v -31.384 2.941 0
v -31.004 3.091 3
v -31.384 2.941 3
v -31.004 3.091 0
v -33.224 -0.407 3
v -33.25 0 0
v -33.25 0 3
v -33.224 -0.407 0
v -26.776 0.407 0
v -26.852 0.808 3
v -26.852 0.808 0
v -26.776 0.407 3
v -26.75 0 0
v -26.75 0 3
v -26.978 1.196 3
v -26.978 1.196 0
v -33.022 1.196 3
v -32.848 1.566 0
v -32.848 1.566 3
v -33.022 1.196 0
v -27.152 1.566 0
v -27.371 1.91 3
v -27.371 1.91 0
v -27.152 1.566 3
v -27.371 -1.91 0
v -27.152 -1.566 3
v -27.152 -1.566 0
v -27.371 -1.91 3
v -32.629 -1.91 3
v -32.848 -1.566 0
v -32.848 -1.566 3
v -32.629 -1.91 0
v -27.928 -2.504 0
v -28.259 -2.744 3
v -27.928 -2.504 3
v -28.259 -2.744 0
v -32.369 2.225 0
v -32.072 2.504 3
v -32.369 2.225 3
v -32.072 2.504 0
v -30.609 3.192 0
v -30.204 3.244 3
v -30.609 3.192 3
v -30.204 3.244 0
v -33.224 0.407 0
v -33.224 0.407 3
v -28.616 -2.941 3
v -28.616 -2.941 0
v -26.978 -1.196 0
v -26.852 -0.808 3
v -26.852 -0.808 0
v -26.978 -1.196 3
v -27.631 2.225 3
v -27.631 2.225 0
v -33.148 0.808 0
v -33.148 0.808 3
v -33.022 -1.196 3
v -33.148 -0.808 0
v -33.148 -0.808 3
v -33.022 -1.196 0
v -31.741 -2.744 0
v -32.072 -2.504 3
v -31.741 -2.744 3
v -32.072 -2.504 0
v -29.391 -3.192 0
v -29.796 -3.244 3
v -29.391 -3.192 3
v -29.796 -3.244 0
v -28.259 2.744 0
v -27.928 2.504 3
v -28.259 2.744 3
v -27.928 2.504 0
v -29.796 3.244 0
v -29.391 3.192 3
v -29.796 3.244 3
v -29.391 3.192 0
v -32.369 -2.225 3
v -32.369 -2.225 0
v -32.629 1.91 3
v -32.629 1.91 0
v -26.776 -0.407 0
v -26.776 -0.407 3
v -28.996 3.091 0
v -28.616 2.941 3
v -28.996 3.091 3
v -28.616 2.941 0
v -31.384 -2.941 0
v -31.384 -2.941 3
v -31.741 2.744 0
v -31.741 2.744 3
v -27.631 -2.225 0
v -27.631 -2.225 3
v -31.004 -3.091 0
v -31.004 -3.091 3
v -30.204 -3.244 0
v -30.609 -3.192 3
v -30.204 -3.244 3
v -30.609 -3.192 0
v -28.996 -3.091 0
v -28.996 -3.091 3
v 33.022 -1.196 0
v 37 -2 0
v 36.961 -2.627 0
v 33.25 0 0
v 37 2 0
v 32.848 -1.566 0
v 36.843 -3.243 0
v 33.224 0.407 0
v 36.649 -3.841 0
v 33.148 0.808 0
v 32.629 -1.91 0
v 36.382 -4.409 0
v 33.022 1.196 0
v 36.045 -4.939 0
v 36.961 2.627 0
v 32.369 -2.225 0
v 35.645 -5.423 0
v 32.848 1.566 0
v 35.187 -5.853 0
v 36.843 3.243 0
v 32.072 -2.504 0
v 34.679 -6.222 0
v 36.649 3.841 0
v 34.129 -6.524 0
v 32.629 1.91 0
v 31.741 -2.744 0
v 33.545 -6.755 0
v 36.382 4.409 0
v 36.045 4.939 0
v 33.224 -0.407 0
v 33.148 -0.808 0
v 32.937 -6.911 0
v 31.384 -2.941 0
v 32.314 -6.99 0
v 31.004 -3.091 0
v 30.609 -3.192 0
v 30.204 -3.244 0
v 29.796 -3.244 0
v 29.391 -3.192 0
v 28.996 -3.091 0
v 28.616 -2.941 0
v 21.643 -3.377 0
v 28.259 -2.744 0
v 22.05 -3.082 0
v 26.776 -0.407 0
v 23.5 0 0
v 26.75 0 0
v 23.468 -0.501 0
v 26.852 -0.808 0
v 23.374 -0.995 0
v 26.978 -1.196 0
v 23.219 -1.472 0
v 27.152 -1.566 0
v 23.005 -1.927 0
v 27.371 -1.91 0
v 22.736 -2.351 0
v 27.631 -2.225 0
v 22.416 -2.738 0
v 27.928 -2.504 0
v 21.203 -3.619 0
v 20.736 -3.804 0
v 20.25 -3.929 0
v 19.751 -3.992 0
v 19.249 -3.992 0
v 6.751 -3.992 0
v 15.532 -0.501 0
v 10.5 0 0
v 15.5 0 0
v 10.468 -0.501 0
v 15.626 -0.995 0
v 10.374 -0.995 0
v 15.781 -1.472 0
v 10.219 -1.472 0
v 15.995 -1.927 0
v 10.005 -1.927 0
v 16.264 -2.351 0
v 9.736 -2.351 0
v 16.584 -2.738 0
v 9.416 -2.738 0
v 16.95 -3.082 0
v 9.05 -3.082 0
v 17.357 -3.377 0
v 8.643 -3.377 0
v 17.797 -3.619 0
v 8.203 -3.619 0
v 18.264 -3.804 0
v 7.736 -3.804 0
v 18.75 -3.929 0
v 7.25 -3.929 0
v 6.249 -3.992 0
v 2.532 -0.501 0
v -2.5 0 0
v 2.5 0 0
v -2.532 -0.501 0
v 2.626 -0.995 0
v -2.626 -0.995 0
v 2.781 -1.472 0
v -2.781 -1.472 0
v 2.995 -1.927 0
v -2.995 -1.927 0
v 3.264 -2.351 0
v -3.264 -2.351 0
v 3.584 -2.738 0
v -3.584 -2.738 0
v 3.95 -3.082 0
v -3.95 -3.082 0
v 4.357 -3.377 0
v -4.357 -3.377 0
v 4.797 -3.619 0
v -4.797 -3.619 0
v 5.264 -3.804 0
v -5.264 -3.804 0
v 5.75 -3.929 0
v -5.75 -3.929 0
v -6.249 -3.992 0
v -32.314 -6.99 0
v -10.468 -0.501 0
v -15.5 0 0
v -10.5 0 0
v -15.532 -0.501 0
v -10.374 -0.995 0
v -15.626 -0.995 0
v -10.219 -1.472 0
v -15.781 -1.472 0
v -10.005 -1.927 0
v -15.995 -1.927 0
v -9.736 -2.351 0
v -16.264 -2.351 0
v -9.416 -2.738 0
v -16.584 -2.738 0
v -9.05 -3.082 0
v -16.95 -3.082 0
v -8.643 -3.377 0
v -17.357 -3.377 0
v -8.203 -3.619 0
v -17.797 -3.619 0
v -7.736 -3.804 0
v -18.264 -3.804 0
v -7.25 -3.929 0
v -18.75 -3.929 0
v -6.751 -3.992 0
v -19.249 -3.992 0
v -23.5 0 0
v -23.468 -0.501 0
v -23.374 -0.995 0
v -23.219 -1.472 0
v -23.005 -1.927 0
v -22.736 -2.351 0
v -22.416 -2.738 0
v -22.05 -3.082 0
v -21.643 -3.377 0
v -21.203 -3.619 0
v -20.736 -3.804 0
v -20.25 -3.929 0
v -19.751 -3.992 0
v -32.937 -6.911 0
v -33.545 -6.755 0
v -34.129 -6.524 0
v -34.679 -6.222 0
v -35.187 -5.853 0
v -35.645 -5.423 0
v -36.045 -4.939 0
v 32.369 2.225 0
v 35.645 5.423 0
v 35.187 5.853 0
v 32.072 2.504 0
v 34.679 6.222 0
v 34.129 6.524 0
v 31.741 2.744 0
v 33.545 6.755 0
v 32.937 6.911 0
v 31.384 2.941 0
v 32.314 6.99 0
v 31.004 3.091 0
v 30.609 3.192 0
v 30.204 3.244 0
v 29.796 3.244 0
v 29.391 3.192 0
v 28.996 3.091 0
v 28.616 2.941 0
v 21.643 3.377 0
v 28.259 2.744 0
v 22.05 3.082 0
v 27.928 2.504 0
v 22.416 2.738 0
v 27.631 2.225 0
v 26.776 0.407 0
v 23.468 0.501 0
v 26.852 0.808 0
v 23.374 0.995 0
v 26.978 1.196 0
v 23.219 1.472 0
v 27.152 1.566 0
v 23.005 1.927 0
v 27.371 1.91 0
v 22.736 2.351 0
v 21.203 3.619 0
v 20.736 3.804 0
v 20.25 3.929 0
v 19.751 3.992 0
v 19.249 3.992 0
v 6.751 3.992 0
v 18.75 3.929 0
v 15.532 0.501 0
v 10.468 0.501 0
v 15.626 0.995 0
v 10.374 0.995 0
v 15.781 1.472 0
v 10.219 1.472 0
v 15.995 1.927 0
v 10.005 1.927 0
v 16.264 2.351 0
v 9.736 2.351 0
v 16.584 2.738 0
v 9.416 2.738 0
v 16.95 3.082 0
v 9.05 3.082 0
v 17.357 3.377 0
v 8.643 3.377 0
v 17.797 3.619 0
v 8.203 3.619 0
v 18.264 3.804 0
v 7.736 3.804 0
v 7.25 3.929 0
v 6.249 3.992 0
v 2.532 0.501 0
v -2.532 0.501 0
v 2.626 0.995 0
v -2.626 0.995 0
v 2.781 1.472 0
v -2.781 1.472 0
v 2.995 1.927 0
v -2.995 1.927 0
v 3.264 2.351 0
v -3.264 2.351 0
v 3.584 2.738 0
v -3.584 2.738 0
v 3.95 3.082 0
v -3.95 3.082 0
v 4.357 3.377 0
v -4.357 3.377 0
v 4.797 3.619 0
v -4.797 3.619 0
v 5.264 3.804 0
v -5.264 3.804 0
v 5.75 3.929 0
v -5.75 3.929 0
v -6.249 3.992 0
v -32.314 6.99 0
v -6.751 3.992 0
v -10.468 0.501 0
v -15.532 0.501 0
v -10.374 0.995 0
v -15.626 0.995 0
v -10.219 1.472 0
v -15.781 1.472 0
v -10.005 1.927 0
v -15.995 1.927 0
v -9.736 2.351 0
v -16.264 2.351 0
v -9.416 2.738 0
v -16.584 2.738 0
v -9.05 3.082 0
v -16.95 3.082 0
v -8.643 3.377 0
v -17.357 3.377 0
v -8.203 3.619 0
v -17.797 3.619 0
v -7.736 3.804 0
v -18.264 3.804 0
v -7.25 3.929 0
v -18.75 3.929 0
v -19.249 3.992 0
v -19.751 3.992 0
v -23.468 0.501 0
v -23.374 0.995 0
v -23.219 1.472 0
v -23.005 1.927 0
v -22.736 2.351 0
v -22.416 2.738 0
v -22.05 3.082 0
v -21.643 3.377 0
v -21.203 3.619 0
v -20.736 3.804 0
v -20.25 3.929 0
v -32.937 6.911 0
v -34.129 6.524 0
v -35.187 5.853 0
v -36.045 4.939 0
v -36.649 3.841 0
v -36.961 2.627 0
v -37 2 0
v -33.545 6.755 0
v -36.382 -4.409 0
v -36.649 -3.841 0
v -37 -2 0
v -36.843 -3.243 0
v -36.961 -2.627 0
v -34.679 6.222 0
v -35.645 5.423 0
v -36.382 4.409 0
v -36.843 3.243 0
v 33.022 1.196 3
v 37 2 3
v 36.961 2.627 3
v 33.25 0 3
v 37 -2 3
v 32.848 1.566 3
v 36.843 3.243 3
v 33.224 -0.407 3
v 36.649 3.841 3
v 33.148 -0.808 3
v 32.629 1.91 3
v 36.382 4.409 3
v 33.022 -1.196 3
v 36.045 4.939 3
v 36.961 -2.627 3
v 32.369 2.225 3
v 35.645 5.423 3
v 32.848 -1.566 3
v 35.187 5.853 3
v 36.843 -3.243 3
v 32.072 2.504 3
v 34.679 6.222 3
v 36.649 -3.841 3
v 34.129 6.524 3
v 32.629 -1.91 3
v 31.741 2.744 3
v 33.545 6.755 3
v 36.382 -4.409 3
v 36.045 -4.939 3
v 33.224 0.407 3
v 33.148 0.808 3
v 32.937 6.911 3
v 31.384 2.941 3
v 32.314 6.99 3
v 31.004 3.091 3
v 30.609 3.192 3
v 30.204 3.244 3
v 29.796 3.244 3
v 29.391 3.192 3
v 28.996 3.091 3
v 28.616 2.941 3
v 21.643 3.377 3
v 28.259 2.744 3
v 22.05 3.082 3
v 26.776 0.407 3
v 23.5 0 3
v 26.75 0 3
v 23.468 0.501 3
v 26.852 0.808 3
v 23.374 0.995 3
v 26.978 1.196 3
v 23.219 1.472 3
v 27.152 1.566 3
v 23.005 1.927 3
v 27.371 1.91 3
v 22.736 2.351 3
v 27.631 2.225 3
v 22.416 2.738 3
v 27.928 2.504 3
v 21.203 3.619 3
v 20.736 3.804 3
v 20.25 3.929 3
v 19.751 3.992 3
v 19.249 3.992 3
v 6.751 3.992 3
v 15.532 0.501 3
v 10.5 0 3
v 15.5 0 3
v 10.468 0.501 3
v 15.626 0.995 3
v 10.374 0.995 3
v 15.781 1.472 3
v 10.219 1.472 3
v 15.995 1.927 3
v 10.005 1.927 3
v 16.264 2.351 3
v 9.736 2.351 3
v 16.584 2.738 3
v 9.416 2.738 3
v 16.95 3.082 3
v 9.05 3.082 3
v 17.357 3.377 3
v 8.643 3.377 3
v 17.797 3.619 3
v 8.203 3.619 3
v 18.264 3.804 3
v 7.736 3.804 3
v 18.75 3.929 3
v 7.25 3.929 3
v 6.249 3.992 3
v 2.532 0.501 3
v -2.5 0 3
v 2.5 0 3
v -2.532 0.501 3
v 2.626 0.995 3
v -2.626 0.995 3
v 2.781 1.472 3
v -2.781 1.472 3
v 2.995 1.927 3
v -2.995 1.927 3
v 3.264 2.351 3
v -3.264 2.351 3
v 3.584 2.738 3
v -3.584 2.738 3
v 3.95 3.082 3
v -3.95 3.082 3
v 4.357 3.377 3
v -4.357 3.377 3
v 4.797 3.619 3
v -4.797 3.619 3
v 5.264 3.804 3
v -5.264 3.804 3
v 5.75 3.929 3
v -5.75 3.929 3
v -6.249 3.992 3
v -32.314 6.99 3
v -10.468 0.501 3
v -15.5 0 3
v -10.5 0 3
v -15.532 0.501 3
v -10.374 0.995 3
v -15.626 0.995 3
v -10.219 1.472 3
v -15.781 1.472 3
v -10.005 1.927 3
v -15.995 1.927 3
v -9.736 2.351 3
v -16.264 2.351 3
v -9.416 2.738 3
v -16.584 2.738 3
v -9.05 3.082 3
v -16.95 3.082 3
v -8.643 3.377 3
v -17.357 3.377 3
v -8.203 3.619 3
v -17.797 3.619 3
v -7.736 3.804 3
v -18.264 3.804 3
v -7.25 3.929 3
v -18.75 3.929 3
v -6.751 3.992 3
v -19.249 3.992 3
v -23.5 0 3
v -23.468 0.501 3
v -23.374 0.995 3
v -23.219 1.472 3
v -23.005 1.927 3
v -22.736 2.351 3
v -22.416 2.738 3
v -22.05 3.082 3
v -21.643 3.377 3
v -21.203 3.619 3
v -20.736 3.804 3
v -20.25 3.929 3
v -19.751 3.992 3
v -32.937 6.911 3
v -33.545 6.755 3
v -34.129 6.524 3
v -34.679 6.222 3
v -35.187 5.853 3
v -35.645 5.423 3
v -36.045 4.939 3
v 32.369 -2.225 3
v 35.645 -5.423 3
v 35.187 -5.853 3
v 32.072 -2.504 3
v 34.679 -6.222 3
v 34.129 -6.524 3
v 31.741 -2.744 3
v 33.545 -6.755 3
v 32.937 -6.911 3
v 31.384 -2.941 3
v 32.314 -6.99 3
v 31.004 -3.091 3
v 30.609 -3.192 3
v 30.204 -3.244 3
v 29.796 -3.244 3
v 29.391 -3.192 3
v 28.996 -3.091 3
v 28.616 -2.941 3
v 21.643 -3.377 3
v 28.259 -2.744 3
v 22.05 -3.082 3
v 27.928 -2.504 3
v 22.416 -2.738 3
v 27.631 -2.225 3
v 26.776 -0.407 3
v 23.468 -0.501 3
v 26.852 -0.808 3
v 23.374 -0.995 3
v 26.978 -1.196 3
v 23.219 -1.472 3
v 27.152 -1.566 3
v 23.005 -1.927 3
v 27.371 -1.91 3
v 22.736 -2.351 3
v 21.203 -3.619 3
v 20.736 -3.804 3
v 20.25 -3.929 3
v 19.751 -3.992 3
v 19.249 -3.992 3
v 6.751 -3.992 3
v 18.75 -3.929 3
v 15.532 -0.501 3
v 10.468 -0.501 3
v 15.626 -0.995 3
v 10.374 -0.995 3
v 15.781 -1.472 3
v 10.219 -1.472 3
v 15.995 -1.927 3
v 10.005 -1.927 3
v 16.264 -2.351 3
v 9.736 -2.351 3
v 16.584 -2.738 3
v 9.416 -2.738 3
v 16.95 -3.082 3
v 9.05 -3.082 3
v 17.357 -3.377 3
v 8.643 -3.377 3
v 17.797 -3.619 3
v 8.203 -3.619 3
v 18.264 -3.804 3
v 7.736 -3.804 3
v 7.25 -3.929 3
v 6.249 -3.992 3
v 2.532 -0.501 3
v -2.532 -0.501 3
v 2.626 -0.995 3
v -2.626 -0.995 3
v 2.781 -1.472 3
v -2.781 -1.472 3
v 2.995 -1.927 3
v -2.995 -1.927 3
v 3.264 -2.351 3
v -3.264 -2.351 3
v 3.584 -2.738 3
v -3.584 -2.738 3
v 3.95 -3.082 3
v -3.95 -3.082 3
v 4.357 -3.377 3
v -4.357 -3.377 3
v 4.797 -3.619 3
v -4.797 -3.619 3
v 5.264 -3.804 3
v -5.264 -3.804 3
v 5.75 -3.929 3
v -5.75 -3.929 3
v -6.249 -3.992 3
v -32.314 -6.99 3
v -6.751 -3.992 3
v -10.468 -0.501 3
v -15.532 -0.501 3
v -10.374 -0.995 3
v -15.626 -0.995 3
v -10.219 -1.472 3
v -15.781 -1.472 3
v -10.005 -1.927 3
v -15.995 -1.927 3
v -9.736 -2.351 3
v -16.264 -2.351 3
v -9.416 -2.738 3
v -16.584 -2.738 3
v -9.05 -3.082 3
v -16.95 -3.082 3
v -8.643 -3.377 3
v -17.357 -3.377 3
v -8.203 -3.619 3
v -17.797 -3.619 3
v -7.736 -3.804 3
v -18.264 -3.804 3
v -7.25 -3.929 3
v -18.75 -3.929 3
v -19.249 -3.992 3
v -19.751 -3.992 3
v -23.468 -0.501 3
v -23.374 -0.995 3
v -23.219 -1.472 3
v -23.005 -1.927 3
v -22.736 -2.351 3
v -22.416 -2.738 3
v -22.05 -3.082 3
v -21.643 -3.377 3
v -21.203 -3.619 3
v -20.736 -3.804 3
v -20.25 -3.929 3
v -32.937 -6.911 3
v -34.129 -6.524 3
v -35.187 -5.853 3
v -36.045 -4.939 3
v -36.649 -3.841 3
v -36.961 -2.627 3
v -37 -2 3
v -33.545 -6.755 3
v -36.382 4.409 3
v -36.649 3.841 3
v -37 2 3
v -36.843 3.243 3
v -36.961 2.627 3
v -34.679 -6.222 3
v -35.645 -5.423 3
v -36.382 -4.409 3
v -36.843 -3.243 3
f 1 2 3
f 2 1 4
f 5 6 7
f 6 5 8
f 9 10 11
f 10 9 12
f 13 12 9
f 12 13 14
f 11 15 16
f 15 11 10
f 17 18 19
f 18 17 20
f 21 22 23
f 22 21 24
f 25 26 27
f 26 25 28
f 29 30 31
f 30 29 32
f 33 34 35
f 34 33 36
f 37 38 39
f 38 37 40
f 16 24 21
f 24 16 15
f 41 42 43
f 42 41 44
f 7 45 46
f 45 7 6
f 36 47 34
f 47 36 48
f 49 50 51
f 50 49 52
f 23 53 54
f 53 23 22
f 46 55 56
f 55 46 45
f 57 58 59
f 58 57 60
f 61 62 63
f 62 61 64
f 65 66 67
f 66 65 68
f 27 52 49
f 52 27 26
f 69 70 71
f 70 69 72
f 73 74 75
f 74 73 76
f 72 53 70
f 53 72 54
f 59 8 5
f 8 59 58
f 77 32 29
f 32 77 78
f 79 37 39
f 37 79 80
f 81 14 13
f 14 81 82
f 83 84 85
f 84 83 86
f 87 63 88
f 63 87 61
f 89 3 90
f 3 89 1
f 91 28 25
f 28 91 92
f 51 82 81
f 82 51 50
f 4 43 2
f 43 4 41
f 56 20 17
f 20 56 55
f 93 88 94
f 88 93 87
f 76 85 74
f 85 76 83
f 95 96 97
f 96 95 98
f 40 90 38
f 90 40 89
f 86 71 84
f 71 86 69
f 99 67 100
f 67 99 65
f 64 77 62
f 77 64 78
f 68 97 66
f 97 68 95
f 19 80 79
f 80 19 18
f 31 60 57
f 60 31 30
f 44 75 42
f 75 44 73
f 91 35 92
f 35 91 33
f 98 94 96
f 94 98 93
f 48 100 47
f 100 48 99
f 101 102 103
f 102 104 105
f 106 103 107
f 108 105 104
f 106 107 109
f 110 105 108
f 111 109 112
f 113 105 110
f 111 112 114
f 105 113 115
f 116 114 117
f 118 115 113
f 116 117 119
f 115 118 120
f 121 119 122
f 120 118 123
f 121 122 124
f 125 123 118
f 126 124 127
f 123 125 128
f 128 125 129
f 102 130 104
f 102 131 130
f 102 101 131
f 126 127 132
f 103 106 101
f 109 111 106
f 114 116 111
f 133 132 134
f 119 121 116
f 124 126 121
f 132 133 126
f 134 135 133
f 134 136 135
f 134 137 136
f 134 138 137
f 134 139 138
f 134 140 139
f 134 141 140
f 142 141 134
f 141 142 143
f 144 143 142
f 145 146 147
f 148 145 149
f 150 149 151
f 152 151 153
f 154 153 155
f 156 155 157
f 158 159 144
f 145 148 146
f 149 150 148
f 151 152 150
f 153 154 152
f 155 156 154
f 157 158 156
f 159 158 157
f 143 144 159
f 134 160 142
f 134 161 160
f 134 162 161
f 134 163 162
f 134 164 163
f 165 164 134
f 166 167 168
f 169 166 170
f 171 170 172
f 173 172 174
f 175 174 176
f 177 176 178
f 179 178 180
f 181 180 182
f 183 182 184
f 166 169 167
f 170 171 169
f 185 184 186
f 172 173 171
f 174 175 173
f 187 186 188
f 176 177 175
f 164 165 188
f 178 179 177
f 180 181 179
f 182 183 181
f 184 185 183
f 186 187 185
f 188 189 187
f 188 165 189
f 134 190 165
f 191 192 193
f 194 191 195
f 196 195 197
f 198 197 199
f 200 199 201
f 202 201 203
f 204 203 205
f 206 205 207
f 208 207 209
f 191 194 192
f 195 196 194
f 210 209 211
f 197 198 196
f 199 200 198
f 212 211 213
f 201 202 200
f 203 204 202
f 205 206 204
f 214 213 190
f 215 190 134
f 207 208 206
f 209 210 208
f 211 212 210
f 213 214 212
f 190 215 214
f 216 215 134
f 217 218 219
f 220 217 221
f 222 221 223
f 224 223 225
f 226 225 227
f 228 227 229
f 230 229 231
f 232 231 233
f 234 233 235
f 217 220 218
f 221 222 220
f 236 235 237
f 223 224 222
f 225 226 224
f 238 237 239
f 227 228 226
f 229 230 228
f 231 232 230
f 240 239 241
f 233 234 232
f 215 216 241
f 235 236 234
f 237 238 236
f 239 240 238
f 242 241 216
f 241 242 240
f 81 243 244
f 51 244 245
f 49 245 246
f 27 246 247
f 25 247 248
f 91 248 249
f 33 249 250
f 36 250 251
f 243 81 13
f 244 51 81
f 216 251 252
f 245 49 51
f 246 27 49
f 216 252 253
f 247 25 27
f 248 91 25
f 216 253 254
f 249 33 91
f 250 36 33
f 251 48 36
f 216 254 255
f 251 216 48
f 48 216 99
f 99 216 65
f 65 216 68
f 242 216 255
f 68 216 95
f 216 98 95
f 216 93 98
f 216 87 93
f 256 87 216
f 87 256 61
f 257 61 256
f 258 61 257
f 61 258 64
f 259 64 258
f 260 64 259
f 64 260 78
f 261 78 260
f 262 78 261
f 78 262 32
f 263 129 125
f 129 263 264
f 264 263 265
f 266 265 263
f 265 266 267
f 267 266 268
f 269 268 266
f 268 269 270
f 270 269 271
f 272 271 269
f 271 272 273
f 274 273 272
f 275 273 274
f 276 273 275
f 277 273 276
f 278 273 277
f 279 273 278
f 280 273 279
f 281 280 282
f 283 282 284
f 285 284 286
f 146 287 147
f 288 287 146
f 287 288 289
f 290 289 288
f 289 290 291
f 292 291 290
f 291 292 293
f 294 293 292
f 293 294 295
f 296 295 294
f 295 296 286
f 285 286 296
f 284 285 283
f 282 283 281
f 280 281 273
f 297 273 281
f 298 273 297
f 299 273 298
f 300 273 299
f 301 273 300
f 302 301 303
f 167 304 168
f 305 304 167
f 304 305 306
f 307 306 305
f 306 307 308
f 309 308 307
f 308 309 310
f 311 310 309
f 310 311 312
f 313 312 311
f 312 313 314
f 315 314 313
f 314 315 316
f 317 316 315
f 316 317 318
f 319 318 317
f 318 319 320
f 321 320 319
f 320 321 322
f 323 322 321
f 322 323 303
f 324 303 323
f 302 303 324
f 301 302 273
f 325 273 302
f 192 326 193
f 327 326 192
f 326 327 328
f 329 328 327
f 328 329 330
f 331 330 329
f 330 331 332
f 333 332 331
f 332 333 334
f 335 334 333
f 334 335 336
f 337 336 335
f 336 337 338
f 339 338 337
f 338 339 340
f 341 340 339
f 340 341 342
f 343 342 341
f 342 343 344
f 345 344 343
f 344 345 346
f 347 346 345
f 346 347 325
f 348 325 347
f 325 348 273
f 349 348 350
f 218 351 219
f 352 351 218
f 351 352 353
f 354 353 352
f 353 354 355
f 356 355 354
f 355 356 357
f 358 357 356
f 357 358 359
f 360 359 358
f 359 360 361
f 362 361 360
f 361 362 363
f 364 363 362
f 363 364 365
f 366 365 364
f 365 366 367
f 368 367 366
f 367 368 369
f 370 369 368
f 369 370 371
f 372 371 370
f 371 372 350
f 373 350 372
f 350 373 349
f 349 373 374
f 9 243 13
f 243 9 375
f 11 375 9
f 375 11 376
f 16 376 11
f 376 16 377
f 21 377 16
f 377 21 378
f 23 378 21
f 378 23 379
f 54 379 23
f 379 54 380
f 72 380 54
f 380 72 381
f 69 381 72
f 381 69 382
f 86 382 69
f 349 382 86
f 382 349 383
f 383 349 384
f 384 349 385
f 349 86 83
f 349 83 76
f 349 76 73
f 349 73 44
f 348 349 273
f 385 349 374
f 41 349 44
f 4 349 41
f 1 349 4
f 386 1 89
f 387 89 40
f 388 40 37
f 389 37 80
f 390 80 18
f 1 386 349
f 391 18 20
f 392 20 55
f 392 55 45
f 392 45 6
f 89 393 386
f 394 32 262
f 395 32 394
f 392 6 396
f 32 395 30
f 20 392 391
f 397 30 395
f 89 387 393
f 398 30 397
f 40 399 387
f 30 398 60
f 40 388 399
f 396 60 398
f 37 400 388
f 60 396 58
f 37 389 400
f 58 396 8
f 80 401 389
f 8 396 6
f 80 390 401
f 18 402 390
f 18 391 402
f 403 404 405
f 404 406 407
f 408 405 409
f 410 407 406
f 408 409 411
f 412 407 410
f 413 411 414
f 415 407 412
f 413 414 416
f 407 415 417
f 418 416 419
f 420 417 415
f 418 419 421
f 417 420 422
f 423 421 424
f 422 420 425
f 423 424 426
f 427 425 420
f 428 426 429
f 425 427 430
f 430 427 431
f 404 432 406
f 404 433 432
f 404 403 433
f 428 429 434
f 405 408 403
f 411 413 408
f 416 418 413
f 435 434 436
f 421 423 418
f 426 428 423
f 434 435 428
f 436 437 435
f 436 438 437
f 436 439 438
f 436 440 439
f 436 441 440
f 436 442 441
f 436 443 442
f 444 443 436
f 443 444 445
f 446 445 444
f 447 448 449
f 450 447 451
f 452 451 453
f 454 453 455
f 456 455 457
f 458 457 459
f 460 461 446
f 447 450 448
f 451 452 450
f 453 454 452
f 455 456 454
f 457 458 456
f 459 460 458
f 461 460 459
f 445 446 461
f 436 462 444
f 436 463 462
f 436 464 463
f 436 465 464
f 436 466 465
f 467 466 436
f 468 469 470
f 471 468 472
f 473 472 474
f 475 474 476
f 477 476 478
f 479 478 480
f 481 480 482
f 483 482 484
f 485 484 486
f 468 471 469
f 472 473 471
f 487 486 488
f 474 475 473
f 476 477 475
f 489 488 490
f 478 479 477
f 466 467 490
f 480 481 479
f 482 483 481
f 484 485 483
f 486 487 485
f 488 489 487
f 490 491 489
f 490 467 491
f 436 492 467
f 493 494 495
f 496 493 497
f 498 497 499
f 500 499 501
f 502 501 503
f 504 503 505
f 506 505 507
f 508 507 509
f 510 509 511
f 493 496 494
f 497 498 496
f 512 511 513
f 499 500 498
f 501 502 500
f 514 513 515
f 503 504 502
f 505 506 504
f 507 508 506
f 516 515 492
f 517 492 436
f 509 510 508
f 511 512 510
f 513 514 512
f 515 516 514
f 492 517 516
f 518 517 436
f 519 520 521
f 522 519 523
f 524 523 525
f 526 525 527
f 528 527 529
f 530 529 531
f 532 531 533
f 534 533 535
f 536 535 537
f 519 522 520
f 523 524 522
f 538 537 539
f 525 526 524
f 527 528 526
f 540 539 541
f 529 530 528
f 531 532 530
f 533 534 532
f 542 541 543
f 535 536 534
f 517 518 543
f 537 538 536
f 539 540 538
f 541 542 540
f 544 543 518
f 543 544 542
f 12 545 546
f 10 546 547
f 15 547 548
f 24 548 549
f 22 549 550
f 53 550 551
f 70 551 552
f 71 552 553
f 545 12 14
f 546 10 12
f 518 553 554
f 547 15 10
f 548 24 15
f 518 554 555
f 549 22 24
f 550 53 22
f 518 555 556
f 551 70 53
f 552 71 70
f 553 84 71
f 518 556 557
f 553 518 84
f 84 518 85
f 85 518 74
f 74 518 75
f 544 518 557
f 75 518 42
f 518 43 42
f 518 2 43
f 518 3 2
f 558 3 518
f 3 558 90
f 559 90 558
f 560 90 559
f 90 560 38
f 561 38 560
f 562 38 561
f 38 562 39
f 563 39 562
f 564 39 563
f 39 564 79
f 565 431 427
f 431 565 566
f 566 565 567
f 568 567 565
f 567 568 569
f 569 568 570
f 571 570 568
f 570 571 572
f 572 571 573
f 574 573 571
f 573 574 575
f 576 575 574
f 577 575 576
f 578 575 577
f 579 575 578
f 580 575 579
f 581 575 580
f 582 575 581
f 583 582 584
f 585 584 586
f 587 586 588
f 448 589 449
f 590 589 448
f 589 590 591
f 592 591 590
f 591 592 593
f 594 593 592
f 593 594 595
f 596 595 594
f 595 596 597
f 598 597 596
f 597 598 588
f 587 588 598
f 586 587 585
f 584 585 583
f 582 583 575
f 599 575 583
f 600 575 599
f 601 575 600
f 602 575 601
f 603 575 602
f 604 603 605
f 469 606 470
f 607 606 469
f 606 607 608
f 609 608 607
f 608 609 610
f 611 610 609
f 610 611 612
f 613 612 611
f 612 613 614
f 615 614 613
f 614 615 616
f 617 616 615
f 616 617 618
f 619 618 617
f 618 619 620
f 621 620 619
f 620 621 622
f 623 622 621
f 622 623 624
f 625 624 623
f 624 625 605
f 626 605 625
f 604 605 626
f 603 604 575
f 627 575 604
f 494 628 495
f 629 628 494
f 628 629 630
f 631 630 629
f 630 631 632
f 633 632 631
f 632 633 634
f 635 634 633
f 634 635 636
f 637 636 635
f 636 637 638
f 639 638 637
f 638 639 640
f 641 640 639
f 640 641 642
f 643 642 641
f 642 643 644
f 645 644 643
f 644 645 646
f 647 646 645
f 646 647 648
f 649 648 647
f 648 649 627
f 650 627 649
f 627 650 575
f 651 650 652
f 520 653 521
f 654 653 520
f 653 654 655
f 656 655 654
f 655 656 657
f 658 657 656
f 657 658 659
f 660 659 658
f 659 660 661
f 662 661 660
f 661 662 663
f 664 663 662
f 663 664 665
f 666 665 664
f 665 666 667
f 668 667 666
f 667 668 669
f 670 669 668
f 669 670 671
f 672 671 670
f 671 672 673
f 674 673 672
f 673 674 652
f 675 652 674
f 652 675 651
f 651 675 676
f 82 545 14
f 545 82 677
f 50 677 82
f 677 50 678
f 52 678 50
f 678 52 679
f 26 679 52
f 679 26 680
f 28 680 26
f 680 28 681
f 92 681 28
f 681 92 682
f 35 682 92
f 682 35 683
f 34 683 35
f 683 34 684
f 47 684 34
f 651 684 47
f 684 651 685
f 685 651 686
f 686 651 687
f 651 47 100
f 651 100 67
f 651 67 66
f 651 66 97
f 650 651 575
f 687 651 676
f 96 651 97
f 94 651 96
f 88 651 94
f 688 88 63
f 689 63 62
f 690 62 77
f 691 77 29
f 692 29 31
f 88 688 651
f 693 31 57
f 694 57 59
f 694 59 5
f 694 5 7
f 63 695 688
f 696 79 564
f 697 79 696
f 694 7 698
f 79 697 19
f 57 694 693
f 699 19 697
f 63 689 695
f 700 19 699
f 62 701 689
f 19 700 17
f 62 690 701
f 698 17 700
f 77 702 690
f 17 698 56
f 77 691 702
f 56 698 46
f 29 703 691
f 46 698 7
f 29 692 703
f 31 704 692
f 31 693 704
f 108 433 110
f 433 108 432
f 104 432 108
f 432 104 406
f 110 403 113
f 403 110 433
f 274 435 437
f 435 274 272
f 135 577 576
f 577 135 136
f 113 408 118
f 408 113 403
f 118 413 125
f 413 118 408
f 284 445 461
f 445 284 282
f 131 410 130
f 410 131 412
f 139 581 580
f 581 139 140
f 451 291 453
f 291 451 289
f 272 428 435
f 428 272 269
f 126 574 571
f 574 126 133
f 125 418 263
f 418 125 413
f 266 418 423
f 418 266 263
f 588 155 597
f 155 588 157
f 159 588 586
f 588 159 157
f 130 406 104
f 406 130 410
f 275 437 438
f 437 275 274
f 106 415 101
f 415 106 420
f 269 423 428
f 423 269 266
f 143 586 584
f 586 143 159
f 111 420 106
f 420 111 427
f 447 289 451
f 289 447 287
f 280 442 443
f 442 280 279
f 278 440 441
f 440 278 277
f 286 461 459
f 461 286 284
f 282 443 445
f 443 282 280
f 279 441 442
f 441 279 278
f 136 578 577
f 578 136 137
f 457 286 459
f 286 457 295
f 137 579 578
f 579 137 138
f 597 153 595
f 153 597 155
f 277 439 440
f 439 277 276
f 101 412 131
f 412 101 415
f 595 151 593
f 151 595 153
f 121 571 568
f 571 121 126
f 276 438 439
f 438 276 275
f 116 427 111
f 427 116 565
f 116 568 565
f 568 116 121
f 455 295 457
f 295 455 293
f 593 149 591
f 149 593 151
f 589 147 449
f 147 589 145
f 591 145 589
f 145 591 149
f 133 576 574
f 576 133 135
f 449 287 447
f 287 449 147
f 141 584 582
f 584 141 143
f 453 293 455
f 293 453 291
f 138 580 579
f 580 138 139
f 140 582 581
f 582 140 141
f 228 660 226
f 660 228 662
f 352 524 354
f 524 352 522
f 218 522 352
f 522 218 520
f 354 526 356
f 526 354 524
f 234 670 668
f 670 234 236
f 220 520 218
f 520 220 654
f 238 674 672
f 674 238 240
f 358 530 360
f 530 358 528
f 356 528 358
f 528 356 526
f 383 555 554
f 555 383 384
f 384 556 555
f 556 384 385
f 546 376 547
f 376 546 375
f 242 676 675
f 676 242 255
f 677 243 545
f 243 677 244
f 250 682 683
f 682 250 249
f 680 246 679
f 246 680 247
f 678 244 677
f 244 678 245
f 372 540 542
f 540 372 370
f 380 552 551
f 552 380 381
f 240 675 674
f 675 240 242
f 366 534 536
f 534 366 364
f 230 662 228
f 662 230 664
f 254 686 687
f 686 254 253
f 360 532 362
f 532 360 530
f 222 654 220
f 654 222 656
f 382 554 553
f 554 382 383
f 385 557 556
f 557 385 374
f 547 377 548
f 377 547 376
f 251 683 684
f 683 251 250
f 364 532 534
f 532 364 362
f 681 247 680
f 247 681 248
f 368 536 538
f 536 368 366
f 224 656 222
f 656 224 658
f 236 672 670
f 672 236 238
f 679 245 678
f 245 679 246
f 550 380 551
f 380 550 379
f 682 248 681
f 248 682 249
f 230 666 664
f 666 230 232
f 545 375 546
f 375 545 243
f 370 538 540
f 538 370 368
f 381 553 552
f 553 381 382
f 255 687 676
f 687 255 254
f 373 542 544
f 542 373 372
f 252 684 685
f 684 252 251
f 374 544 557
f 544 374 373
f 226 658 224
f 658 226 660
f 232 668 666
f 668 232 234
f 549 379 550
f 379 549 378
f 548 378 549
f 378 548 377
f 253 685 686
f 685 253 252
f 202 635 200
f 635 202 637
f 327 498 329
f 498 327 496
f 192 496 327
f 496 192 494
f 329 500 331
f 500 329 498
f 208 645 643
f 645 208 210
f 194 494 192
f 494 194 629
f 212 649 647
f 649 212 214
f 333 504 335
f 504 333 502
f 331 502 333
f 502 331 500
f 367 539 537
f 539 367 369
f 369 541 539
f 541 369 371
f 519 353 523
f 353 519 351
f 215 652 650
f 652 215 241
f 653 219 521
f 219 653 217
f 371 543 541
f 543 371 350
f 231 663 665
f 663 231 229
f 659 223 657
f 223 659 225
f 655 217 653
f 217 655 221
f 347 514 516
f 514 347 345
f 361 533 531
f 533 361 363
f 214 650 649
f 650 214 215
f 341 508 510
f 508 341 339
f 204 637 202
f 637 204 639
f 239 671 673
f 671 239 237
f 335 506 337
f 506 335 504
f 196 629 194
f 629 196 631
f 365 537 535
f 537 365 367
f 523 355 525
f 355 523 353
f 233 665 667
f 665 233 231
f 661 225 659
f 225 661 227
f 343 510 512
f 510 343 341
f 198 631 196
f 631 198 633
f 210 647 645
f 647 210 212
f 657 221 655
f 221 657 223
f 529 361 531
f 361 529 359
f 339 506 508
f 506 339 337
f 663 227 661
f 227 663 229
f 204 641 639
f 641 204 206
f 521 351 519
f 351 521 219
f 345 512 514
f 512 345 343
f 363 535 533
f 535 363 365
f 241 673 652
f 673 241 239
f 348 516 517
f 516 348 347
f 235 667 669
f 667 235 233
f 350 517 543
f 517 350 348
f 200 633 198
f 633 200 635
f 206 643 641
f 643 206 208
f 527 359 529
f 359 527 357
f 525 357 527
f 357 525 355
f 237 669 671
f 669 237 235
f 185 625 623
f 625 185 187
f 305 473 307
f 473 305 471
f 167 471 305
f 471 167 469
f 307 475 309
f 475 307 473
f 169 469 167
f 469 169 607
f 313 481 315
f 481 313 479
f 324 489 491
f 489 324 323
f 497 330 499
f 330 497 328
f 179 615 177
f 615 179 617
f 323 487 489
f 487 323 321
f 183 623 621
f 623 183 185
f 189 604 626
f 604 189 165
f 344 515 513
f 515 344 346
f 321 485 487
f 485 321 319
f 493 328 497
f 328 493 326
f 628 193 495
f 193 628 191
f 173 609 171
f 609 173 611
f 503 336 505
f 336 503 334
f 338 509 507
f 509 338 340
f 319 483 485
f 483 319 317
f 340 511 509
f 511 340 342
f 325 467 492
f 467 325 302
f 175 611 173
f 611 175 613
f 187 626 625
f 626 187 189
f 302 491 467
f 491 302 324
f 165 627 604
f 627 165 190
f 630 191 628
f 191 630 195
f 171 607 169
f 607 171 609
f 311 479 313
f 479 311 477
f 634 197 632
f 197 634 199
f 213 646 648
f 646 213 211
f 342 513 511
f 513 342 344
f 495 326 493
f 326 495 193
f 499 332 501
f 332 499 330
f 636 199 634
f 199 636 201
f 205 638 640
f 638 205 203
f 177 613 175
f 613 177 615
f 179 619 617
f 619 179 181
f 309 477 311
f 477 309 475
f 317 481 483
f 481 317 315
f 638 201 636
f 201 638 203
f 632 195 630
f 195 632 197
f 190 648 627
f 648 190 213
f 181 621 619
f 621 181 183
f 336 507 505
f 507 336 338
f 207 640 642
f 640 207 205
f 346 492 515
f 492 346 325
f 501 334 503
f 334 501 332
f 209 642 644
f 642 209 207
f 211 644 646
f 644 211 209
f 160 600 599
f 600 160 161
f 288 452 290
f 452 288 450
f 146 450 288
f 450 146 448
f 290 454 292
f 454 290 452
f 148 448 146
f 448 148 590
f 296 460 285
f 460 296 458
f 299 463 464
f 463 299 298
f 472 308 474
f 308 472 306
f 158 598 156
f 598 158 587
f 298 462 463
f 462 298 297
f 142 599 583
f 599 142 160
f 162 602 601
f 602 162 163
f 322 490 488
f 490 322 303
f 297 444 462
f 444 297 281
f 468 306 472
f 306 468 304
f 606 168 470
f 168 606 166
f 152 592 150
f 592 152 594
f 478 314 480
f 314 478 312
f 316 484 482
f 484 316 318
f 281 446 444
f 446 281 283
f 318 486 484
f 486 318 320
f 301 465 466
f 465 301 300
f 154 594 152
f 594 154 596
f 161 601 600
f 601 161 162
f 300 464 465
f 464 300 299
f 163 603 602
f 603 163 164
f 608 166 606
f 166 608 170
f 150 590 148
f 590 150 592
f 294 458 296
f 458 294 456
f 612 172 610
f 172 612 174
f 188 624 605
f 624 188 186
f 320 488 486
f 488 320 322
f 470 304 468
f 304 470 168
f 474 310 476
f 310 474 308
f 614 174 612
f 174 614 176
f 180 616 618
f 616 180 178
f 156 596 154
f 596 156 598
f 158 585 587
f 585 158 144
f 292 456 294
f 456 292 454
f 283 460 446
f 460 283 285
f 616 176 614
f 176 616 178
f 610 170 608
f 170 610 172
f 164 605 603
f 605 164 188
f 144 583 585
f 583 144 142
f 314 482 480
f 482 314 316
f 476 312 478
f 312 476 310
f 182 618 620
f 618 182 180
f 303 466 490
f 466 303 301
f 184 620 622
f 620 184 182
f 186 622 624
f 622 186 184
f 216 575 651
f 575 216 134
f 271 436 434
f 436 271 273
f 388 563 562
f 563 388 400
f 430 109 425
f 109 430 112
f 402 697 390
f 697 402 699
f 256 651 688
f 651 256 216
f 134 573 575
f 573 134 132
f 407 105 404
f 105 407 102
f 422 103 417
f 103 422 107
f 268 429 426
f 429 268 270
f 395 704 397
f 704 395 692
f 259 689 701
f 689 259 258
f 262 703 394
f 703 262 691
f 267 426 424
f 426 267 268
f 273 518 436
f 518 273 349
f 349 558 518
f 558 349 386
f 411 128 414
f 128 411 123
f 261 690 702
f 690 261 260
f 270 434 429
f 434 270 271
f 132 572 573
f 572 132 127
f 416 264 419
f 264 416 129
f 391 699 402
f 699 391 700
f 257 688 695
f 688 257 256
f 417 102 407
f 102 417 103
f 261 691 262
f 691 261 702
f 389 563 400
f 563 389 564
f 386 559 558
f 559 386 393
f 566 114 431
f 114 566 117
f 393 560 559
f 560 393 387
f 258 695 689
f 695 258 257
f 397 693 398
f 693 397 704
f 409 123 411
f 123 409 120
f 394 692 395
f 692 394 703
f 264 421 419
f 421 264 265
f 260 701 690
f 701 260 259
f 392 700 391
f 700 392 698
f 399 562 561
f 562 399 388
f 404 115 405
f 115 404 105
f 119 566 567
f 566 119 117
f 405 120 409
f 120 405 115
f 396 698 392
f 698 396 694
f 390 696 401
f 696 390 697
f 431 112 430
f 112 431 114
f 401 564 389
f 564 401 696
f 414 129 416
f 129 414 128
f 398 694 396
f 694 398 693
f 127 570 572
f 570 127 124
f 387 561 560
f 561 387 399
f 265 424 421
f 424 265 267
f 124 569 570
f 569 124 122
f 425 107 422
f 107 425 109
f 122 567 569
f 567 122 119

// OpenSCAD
$fn = 50;

difference() {
	union() {
		hull() {
			translate(v = [-32.0, 2.0, 0]) {
				cylinder(h = 3, r = 5);
			}
			translate(v = [32.0, 2.0, 0]) {
				cylinder(h = 3, r = 5);
			}
			translate(v = [-32.0, -2.0, 0]) {
				cylinder(h = 3, r = 5);
			}
			translate(v = [32.0, -2.0, 0]) {
				cylinder(h = 3, r = 5);
			}
		}
	}
	union() {
		translate(v = [-30.0, 0.0, 0]) {
			cylinder(h = 3, r = 3.25);
		}
		translate(v = [30.0, 0.0, 0]) {
			cylinder(h = 3, r = 3.25);
		}
		translate(v = [-19.5, 0, 0.0]) {
			cylinder(h = 3, r = 4.0);
		}
		translate(v = [-6.5, 0, 0.0]) {
			cylinder(h = 3, r = 4.0);
		}
		translate(v = [6.5, 0, 0.0]) {
			cylinder(h = 3, r = 4.0);
		}
		translate(v = [19.5, 0, 0.0]) {
			cylinder(h = 3, r = 4.0);
		}
	}
}
